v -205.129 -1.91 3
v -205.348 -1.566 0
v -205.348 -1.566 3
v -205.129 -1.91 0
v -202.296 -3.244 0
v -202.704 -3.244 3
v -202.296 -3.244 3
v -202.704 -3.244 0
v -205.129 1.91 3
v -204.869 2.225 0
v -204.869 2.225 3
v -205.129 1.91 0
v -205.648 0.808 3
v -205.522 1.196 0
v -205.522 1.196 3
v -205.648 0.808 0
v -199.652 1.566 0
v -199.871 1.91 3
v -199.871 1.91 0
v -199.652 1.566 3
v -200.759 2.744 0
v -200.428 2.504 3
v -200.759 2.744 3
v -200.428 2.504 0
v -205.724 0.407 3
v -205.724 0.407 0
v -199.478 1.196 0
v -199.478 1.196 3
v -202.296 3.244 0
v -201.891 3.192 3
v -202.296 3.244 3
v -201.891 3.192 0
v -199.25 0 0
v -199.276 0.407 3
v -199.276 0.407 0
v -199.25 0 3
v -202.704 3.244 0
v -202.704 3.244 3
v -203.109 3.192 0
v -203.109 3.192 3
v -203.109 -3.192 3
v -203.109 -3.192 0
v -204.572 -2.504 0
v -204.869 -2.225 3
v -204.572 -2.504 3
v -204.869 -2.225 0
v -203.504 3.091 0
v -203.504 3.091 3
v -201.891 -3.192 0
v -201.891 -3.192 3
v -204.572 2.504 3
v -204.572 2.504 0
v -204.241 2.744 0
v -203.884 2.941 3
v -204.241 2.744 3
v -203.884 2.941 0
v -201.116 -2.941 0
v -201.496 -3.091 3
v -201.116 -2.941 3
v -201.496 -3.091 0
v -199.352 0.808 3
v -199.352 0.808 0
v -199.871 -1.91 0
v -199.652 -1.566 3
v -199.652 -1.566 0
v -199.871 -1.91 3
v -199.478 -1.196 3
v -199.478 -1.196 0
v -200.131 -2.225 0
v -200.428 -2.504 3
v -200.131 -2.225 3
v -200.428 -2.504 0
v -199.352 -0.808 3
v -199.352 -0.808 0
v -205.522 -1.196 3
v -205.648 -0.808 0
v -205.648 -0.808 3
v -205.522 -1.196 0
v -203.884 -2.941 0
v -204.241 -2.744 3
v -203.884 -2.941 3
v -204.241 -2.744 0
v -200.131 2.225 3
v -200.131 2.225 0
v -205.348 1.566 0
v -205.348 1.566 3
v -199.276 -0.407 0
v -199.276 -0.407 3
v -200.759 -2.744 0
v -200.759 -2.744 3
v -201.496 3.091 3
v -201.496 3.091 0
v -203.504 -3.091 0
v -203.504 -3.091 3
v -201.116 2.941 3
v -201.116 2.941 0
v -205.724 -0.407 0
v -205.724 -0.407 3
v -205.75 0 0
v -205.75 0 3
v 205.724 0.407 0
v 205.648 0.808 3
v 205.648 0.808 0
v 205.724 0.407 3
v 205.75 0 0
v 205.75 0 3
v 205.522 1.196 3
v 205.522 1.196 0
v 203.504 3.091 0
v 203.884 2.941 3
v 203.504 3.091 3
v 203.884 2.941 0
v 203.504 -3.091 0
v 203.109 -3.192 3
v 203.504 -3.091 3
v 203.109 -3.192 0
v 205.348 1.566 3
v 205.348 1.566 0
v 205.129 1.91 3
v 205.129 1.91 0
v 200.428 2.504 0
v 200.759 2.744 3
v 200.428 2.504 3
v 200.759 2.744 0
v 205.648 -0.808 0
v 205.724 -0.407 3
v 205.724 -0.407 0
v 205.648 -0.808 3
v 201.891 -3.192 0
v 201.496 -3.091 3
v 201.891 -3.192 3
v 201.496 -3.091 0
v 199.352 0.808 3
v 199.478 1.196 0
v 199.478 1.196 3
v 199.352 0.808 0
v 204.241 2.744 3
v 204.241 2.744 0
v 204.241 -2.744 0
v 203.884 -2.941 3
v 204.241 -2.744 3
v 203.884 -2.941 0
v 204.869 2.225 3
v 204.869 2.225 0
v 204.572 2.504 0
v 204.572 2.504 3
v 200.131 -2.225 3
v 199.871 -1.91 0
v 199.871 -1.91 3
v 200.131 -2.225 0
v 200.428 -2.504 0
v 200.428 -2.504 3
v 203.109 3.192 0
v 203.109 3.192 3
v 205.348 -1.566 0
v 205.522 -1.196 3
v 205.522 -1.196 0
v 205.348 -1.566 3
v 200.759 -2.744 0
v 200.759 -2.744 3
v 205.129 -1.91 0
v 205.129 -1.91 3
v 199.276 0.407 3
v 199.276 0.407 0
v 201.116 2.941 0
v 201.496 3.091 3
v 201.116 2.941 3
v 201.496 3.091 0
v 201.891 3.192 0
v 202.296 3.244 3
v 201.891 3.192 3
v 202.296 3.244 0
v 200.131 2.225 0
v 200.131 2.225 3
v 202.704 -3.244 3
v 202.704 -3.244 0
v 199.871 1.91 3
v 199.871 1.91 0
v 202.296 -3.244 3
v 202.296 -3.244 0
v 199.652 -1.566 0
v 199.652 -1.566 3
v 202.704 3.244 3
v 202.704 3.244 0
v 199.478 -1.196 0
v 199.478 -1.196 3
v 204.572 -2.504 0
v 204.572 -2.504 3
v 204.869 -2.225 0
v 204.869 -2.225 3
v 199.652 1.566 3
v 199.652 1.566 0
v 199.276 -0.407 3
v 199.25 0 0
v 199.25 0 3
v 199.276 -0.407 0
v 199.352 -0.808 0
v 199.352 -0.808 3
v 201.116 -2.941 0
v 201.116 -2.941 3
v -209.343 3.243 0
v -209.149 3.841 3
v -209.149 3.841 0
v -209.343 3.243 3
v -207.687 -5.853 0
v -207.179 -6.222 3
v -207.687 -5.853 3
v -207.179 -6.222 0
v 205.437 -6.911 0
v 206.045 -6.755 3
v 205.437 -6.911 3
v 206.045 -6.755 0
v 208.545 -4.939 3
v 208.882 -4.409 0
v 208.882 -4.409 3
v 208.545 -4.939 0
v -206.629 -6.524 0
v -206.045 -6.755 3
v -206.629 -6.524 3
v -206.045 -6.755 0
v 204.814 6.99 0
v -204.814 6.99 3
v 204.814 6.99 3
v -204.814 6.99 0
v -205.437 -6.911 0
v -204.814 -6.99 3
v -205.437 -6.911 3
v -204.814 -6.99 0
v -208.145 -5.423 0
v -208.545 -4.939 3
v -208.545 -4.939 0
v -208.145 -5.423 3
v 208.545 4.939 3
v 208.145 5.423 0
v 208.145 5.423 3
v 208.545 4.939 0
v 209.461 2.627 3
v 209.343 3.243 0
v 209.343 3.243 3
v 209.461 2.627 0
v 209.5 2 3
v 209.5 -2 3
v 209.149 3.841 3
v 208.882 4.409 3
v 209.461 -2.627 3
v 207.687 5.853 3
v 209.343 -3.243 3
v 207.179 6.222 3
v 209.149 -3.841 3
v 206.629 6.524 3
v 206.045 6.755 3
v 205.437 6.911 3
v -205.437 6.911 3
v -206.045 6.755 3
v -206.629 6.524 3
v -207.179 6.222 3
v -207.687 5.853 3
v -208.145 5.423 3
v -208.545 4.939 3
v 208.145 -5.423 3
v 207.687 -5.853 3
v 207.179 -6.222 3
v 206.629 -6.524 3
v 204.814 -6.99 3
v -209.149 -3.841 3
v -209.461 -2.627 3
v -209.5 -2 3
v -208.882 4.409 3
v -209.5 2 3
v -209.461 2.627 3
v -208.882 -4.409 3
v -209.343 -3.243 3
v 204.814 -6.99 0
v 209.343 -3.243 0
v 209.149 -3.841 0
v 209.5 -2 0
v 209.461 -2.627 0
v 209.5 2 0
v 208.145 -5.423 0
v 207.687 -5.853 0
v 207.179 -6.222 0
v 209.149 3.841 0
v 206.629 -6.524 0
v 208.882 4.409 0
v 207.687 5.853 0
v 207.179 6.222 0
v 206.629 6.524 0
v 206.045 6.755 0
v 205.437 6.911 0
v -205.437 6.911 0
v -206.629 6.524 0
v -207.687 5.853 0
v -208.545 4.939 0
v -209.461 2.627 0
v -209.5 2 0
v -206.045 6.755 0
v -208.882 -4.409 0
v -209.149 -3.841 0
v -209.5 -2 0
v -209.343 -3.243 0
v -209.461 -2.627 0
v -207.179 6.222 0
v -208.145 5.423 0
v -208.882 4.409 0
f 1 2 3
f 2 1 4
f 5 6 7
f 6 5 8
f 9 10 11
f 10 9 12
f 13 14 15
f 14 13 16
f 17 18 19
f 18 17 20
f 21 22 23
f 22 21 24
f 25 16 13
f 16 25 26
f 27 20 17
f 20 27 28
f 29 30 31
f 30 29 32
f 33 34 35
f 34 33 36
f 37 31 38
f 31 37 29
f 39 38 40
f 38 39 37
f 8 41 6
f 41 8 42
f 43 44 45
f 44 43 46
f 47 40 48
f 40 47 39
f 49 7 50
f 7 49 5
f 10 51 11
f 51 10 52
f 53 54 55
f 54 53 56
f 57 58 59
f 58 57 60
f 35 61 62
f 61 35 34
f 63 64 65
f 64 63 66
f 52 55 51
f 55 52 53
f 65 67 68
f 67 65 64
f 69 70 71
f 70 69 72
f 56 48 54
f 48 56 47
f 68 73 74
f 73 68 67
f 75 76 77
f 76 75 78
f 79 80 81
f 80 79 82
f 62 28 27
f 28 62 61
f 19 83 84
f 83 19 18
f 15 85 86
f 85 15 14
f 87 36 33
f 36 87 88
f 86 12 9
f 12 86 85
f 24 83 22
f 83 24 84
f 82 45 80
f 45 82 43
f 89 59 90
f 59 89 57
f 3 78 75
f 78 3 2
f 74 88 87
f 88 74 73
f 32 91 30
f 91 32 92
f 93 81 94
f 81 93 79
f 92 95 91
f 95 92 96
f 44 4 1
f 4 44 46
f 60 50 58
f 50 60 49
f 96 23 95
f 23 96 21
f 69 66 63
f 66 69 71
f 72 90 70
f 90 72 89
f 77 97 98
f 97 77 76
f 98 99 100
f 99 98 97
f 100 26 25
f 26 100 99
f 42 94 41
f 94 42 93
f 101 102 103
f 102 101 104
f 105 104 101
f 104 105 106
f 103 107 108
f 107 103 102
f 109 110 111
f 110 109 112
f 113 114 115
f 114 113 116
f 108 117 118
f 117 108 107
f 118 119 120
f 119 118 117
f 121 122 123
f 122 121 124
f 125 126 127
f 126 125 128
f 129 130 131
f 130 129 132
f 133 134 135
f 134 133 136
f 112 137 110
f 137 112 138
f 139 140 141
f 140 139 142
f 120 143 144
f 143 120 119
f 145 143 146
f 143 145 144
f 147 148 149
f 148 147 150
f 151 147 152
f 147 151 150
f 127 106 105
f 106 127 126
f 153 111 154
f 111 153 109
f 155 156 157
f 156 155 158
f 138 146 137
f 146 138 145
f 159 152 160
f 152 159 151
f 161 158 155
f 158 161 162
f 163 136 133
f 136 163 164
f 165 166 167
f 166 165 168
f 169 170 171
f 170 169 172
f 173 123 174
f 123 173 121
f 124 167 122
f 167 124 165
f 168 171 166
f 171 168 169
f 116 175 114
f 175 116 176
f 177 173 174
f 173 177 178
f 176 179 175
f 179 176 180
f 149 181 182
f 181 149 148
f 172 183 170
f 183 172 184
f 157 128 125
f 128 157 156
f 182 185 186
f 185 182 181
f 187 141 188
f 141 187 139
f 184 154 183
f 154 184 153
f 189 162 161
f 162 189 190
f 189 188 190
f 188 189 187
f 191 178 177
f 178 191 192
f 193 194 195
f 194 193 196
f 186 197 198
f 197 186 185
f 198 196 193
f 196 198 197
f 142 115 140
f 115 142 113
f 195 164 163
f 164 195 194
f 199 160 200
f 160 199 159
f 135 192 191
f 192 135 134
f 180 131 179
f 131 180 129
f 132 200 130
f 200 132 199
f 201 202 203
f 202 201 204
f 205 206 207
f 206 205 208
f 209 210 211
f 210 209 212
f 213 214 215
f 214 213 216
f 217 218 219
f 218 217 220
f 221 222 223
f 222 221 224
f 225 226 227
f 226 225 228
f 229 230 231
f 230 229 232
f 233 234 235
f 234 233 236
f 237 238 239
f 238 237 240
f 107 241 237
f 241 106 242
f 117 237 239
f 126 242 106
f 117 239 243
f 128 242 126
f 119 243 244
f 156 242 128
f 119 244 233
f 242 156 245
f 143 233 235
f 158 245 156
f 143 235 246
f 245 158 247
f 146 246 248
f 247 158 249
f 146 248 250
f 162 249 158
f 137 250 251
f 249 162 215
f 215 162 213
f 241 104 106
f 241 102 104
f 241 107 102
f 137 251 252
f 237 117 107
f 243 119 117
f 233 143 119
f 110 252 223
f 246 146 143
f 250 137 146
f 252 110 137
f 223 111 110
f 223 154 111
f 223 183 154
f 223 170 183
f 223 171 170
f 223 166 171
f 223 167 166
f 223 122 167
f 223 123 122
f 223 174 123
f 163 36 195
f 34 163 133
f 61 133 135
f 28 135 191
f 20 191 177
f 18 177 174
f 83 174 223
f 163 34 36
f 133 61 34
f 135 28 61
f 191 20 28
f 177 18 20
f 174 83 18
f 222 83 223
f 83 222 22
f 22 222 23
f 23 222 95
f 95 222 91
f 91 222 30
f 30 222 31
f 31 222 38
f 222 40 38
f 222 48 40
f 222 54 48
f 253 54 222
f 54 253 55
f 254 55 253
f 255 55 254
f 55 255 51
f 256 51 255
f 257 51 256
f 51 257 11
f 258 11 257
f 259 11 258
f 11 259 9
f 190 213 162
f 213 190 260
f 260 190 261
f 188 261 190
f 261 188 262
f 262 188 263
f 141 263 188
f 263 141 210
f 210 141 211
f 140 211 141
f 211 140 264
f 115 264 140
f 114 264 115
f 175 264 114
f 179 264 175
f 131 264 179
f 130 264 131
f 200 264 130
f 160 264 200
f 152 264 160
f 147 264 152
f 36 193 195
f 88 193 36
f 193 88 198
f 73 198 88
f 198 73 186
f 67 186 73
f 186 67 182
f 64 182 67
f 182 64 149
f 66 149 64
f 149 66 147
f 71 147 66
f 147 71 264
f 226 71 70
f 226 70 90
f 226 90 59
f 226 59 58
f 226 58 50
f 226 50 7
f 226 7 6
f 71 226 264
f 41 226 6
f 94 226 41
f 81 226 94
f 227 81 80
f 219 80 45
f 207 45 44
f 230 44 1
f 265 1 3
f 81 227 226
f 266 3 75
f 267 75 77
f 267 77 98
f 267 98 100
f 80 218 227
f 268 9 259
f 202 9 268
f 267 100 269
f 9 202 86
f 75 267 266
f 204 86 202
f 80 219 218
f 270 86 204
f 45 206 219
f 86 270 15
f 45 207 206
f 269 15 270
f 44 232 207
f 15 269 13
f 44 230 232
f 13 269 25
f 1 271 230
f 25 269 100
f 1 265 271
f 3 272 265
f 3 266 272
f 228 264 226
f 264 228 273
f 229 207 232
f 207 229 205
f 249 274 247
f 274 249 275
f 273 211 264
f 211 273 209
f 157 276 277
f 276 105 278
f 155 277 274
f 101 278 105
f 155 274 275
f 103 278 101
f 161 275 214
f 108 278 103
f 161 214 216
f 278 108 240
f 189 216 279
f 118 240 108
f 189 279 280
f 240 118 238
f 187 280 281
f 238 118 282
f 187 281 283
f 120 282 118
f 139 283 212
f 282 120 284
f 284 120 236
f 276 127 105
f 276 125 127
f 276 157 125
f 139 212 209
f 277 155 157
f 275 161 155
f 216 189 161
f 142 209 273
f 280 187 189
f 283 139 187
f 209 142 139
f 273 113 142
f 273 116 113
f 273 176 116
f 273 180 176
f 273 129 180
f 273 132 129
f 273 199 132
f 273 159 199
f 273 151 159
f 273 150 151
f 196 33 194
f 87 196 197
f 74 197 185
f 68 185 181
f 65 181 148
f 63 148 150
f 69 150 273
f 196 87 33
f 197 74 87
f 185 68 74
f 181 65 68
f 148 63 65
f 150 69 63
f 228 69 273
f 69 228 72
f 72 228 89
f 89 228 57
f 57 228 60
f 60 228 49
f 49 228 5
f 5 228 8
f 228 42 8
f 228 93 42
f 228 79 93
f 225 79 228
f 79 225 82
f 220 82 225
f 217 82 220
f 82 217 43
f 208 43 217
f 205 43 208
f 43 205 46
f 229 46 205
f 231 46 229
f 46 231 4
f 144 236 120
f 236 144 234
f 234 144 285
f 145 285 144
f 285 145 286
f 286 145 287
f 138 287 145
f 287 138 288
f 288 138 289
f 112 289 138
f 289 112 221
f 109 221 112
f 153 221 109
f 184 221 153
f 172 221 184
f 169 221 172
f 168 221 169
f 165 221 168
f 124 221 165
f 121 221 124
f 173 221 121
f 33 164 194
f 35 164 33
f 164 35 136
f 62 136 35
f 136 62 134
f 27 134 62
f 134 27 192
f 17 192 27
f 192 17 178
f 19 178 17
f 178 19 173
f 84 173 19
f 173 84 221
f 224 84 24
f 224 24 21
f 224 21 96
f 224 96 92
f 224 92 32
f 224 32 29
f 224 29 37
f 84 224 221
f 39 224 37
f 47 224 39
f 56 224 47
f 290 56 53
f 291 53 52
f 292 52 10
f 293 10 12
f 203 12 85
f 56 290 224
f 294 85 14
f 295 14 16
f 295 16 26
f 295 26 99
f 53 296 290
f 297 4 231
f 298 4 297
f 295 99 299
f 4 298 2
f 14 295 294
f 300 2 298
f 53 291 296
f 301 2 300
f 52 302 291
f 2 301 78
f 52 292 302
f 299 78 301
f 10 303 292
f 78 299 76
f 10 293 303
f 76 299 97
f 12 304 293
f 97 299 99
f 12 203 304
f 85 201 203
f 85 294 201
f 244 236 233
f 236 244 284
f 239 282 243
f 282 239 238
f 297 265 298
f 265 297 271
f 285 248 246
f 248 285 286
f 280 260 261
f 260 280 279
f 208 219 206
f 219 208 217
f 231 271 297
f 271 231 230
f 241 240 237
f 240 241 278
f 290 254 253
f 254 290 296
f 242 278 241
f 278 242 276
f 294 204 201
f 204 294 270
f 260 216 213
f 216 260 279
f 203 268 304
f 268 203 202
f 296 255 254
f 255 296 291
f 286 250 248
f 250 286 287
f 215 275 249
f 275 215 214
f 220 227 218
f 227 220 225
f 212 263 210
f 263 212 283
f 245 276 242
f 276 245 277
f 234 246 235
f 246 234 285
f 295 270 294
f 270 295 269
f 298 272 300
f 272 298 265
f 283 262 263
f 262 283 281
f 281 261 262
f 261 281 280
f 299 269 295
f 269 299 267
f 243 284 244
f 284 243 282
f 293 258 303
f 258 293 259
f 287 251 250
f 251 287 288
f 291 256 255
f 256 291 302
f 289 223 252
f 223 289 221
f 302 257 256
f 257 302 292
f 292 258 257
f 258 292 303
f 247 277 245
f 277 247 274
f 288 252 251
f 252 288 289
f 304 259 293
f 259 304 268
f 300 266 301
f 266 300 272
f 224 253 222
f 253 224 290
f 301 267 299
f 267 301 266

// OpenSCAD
$fn = 50;


difference() {
	union() {
		hull() {
			translate(v = [-204.5000000000, 2.0000000000, 0]) {
				cylinder(h = 3, r = 5);
			}
			translate(v = [204.5000000000, 2.0000000000, 0]) {
				cylinder(h = 3, r = 5);
			}
			translate(v = [-204.5000000000, -2.0000000000, 0]) {
				cylinder(h = 3, r = 5);
			}
			translate(v = [204.5000000000, -2.0000000000, 0]) {
				cylinder(h = 3, r = 5);
			}
		}
	}
	union() {
		translate(v = [-202.5000000000, 0.0000000000, -100.0000000000]) {
			cylinder(h = 200, r = 3.2500000000);
		}
		translate(v = [-202.5000000000, 0.0000000000, -100.0000000000]) {
			cylinder(h = 200, r = 3.2500000000);
		}
		translate(v = [202.5000000000, 0.0000000000, -100.0000000000]) {
			cylinder(h = 200, r = 3.2500000000);
		}
		translate(v = [202.5000000000, 0.0000000000, -100.0000000000]) {
			cylinder(h = 200, r = 3.2500000000);
		}
	}
}
